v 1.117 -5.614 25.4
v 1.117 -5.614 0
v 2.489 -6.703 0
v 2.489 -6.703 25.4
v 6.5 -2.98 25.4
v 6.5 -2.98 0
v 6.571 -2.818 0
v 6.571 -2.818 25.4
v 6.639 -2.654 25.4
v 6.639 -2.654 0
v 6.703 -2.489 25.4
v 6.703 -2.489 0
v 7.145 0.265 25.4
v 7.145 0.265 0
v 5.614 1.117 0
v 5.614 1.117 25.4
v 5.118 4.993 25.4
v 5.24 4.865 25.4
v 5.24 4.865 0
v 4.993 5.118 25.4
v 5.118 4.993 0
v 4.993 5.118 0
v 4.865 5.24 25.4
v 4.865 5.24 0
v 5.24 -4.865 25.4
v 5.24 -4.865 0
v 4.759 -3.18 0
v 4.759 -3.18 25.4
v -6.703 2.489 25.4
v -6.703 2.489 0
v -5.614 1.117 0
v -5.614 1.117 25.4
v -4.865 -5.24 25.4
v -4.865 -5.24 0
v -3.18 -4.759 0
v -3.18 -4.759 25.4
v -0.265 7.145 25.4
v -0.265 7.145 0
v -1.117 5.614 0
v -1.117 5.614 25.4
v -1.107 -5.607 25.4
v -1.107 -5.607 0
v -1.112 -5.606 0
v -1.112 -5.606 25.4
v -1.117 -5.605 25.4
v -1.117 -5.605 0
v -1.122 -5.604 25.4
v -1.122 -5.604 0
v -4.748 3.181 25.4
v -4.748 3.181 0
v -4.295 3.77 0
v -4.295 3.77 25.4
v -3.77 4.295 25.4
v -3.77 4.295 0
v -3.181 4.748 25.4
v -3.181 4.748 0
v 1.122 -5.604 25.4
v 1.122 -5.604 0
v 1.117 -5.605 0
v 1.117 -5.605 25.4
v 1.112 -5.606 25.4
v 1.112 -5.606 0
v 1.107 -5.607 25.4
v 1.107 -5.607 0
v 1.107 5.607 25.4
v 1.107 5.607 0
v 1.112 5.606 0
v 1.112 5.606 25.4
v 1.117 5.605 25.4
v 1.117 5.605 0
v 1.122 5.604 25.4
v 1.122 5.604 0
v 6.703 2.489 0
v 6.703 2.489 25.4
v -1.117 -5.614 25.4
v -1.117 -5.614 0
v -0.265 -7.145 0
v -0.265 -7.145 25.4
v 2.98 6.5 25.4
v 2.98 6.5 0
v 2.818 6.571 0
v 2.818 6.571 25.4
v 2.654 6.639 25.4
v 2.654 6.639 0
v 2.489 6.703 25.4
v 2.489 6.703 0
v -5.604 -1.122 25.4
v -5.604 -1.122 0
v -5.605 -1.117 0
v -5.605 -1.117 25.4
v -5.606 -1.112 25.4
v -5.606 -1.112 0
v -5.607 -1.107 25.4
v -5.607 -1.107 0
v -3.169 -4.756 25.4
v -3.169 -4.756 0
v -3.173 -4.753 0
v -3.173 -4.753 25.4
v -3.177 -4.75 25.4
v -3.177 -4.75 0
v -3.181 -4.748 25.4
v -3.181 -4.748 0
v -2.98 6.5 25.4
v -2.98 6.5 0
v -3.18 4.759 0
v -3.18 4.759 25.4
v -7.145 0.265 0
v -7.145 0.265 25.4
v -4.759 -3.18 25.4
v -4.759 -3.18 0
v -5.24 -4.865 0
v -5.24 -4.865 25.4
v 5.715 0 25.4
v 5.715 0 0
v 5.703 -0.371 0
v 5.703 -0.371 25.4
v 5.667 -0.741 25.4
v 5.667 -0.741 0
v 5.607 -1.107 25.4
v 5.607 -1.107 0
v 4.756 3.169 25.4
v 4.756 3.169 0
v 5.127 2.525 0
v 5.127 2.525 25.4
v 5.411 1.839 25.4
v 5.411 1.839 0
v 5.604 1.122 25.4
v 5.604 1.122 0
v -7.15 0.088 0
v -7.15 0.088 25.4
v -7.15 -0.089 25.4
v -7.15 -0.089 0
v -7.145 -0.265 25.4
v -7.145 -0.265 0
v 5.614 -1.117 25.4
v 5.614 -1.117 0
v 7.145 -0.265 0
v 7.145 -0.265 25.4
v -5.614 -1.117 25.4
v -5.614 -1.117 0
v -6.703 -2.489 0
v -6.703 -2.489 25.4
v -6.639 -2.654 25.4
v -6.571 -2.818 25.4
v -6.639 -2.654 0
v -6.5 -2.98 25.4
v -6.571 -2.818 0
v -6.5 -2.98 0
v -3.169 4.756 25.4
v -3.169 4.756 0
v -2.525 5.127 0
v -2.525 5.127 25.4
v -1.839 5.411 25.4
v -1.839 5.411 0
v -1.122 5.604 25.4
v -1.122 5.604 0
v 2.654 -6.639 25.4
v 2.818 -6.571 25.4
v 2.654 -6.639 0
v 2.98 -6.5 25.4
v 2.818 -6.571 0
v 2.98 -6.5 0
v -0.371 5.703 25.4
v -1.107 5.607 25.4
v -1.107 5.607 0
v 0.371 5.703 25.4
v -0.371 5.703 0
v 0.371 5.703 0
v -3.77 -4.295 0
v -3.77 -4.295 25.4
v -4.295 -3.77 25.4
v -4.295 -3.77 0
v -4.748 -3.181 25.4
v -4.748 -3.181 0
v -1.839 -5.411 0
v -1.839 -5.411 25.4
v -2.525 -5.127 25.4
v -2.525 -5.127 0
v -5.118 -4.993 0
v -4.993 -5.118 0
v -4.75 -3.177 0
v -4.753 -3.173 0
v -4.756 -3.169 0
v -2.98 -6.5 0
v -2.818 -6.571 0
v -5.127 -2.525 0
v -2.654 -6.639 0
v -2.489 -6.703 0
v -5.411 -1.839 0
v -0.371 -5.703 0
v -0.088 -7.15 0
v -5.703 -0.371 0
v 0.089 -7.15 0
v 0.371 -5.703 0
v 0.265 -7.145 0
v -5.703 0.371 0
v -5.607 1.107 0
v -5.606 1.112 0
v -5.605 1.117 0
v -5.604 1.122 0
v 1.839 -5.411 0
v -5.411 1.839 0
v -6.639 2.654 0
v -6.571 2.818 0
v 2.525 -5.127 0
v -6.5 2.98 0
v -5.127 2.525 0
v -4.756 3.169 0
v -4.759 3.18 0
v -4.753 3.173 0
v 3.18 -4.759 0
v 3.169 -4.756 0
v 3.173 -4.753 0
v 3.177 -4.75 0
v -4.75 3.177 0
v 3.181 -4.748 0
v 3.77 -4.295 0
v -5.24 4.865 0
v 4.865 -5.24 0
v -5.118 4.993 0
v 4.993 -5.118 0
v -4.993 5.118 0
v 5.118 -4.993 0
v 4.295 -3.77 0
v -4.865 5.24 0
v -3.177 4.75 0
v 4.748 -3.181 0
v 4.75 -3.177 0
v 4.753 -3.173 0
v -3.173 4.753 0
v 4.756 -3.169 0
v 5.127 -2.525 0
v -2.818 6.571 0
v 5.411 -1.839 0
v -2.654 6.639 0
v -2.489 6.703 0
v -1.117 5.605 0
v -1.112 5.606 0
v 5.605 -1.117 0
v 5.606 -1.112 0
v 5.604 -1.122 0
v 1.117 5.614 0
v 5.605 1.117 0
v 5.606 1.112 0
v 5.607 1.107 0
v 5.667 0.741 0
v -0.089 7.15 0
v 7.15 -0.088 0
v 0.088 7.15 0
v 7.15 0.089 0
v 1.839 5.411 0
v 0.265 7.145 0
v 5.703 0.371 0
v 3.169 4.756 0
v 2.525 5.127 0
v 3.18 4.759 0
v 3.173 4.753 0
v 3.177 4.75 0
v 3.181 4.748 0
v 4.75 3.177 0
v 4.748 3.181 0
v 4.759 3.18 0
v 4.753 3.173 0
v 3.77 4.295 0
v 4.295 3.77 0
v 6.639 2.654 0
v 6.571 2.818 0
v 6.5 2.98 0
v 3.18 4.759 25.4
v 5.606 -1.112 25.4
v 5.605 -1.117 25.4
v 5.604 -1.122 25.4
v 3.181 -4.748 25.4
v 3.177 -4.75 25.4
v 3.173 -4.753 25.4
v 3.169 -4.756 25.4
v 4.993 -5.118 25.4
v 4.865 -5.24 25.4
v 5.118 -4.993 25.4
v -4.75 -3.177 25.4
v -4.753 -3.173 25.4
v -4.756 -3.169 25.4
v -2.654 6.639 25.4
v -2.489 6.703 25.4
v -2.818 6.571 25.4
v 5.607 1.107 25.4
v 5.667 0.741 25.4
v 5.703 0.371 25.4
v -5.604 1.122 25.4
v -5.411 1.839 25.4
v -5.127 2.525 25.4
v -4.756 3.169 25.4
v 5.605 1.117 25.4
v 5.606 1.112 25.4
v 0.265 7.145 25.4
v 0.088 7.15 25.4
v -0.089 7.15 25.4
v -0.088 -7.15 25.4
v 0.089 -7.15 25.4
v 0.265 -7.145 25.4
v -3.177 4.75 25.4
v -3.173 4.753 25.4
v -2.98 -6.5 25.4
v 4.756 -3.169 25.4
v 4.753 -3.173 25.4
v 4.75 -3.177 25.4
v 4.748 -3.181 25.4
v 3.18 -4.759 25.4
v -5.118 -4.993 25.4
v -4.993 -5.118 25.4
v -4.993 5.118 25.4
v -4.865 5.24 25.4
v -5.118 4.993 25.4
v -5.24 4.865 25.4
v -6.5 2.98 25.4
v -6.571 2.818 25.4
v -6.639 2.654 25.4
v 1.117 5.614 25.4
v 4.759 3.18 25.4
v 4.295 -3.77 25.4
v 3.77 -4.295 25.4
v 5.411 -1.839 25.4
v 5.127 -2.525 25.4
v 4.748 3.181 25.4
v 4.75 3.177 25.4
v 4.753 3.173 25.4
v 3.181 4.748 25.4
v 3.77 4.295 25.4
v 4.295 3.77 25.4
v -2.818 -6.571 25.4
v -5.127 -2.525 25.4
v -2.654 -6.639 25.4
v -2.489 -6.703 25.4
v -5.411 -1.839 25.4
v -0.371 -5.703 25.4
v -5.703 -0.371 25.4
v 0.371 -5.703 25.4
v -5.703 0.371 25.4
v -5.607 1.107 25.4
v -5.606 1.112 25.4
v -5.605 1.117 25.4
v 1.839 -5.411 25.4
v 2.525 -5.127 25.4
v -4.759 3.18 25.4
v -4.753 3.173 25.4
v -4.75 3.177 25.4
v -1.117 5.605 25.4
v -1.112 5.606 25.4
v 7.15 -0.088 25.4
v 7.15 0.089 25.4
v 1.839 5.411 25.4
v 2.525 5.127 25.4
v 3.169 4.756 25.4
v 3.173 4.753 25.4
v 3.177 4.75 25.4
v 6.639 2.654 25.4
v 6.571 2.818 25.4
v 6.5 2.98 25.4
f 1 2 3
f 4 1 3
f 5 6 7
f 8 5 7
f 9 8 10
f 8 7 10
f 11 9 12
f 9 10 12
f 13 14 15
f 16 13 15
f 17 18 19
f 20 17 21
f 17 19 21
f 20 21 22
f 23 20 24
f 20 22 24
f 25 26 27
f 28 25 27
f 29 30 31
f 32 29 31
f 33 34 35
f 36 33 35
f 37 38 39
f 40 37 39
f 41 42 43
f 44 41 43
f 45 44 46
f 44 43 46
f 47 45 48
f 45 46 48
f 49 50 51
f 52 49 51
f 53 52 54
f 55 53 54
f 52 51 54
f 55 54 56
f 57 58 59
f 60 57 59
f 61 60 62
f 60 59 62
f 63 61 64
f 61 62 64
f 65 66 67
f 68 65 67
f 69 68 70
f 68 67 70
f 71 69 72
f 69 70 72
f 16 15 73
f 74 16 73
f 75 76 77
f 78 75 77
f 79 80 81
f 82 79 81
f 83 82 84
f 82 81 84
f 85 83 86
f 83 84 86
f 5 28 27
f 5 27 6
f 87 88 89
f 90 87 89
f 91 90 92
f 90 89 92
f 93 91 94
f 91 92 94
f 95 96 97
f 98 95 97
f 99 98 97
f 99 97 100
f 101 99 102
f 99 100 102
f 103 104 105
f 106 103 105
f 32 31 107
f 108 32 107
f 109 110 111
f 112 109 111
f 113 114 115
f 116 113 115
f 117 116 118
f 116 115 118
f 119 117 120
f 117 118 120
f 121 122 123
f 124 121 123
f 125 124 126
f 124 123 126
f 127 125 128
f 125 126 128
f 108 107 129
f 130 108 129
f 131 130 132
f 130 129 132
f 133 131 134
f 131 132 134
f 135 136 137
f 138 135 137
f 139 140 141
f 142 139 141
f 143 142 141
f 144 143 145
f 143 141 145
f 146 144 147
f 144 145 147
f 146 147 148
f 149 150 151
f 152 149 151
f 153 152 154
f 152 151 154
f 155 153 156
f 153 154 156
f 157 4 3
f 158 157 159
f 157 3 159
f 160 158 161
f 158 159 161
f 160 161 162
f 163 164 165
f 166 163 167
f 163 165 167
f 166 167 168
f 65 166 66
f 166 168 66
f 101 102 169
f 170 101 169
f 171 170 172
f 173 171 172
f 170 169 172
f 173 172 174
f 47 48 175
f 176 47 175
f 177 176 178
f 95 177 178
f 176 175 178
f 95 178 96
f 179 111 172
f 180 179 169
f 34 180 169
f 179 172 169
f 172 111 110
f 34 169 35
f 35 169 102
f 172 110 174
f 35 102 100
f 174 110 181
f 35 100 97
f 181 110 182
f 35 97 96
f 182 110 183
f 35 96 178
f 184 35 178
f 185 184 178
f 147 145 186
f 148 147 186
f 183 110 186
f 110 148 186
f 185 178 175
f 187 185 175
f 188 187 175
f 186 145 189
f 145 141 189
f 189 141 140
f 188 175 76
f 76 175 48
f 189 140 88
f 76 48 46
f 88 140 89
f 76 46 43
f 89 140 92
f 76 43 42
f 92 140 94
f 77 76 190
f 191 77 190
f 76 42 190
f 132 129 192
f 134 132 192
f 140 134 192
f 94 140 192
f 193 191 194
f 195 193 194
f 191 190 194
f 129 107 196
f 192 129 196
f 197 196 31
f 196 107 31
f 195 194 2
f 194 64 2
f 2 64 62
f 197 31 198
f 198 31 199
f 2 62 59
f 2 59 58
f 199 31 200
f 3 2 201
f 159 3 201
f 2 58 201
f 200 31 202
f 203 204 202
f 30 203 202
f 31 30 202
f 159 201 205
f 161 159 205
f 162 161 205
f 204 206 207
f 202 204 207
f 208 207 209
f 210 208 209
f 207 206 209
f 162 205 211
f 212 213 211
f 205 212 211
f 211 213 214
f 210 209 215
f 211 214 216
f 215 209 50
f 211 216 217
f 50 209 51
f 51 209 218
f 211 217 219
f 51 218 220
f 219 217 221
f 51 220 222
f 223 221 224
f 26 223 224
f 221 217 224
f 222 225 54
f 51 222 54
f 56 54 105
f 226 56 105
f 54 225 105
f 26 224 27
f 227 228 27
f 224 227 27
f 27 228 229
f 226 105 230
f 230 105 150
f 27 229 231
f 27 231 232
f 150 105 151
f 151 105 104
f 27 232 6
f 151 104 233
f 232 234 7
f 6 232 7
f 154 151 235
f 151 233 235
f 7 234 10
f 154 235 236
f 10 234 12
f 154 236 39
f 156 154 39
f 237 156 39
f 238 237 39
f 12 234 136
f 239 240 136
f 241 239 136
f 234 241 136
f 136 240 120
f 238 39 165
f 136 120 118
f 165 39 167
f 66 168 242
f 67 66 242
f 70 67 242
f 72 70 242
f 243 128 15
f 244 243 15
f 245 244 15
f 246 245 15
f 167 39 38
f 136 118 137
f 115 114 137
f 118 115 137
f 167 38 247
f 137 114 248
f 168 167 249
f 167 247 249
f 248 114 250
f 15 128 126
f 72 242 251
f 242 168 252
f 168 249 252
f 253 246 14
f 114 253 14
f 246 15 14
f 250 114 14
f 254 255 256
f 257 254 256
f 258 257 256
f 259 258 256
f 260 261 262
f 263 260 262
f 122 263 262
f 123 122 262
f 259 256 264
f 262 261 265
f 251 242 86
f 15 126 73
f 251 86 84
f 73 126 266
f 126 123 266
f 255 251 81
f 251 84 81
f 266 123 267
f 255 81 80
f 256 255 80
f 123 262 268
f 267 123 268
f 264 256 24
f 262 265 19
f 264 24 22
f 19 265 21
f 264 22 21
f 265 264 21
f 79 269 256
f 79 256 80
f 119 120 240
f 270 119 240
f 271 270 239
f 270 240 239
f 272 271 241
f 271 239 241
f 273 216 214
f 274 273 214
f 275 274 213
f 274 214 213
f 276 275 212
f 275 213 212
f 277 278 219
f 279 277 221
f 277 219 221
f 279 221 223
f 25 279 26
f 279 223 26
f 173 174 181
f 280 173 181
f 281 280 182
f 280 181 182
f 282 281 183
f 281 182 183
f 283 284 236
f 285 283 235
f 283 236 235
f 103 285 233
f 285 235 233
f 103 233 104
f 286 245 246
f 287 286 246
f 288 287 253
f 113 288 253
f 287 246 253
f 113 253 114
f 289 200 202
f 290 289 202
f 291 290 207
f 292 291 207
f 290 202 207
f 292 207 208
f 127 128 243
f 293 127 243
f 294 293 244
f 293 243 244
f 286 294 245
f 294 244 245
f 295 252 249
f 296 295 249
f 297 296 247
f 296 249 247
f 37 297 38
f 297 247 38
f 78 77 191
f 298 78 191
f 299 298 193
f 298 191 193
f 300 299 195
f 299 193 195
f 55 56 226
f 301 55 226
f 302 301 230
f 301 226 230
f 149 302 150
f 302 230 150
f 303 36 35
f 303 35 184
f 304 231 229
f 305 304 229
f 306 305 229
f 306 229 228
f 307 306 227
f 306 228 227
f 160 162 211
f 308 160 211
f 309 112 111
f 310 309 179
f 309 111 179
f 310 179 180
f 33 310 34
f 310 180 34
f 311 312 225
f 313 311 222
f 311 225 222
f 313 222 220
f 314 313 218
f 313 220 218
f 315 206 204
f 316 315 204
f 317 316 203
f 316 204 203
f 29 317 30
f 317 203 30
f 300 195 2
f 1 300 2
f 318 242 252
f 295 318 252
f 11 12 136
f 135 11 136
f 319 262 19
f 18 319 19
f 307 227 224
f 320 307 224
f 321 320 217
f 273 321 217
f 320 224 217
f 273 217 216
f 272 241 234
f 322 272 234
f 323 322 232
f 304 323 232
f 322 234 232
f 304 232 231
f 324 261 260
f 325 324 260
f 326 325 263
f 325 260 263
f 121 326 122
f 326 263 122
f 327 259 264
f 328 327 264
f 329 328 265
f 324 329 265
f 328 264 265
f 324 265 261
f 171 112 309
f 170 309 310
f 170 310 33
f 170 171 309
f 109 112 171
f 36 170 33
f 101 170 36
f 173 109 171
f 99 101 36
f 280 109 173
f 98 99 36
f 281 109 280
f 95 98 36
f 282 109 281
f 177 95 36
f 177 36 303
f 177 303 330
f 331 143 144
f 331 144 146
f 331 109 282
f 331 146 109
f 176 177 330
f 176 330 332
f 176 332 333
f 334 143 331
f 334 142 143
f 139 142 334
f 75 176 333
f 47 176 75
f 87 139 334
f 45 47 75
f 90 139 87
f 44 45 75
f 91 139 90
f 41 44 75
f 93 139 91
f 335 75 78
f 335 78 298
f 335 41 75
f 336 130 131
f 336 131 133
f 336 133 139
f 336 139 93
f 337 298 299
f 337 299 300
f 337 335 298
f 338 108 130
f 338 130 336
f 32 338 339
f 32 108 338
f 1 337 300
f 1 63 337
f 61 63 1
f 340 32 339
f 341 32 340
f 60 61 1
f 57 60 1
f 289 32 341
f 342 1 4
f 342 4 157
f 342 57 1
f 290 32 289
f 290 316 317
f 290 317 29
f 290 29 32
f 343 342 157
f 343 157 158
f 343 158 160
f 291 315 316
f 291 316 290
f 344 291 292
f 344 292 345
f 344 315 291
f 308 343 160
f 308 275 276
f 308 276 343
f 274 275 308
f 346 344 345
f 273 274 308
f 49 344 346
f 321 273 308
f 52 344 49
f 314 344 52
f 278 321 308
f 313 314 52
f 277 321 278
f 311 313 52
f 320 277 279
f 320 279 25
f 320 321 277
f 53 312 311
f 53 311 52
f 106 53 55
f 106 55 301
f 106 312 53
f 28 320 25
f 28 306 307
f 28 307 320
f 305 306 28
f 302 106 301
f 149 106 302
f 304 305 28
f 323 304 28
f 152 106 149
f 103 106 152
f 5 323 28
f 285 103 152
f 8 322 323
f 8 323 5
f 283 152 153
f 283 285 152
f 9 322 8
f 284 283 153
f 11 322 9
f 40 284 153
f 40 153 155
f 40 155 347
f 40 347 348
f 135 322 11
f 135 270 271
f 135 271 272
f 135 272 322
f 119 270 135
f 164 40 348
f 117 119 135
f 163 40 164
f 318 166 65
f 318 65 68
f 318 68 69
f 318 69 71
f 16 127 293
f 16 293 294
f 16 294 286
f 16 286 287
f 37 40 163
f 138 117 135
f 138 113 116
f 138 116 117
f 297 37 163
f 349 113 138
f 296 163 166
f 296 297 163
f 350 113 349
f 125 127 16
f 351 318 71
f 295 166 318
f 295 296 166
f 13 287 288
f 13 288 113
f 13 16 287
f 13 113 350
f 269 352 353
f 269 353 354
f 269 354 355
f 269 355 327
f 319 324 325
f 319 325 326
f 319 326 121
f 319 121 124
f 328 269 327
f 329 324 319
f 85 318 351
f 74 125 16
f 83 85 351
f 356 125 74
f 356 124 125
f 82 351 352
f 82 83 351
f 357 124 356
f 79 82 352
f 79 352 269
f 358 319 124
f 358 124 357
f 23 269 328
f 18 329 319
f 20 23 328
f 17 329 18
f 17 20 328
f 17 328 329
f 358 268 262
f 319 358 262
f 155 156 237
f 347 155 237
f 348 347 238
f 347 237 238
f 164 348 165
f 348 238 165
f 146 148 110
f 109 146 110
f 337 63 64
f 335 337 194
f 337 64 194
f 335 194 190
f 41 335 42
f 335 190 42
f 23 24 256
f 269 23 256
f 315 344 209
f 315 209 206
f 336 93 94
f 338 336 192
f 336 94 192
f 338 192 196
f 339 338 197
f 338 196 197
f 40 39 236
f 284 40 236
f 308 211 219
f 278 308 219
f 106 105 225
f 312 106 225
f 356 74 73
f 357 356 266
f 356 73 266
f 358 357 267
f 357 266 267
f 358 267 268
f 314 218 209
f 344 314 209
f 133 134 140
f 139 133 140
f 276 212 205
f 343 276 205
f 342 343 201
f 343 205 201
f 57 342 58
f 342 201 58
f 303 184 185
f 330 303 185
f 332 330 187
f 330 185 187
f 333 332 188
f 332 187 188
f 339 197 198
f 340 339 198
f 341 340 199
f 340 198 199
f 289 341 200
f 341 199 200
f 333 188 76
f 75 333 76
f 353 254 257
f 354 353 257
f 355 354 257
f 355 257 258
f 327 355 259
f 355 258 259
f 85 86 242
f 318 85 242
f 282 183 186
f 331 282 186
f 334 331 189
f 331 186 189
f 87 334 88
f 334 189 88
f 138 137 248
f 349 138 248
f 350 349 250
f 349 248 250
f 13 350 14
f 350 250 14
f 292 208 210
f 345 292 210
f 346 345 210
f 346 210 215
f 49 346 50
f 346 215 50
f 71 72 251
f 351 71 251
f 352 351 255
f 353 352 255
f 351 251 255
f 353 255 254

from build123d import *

# Parameters (mm, degrees)
F1_DEPTH = 25.4


with BuildPart() as f1:
    # F0 (on Top) → F1 (new body)
    with BuildSketch(Plane.XY):
        with BuildLine():
            Line((1.1166946055, 5.6140031267), (0.2654481758, 7.145170906))
            ThreePointArc((0.2654481758, 7.145170906), (-6.1331e-06, 7.1501), (-0.2654604336, 7.1451704506))
            Line((-0.2654604336, 7.1451704506), (-1.1166946958, 5.6140031087))
            Line((-1.1166946958, 5.6140031087), (-1.107454392, 5.6066718978))
            ThreePointArc((-1.107454392, 5.6066718978), (0, 5.715), (1.107454392, 5.6066718978))
            Line((1.107454392, 5.6066718978), (1.1166946055, 5.6140031267))
        make_face()
        with BuildLine():
            Line((2.4890848916, 6.7028640455), (1.1166946055, 5.6140031267))
            Line((1.1166946055, 5.6140031267), (1.122426, 5.6036938598))
            ThreePointArc((1.122426, 5.6036938598), (2.187035816, 5.2799715283), (3.168734892, 4.7560849639))
            Line((3.168734892, 4.7560849639), (3.1800772759, 4.7593220597))
            Line((3.1800772759, 4.7593220597), (2.9795806637, 6.4996945373))
            ThreePointArc((2.9795806637, 6.4996945373), (2.7362191435, 6.6058333924), (2.4890848916, 6.7028640455))
        make_face()
        with BuildLine():
            Line((1.122426, 5.6036938598), (1.1166946055, 5.6140031267))
            Line((1.1166946055, 5.6140031267), (1.107454392, 5.6066718978))
            ThreePointArc((1.107454392, 5.6066718978), (1.1149411903, 5.6051878775), (1.122426, 5.6036938598))
        make_face()
        with BuildLine():
            Line((-1.107454392, 5.6066718978), (-1.1166946958, 5.6140031087))
            Line((-1.1166946958, 5.6140031087), (-1.122426, 5.6036938598))
            ThreePointArc((-1.122426, 5.6036938598), (-1.1149411903, 5.6051878775), (-1.107454392, 5.6066718978))
        make_face()
        with BuildLine():
            Line((-1.122426, 5.6036938598), (-1.1166946958, 5.6140031087))
            Line((-1.1166946958, 5.6140031087), (-2.4890963905, 6.7028597754))
            ThreePointArc((-2.4890963905, 6.7028597754), (-2.736230476, 6.6058286984), (-2.9795918141, 6.4996894258))
            Line((-2.9795918141, 6.4996894258), (-3.1800773524, 4.7593220085))
            Line((-3.1800773524, 4.7593220085), (-3.168734892, 4.7560849639))
            ThreePointArc((-3.168734892, 4.7560849639), (-2.187035816, 5.2799715283), (-1.122426, 5.6036938598))
        make_face()
        with BuildLine():
            Line((3.1800772759, 4.7593220597), (3.168734892, 4.7560849639))
            ThreePointArc((3.168734892, 4.7560849639), (3.1750838817, 4.7518488343), (3.1814272084, 4.7476042293))
            Line((3.1814272084, 4.7476042293), (3.1800772759, 4.7593220597))
        make_face()
        with BuildLine():
            ThreePointArc((-3.1814272084, 4.7476042293), (-3.1750838817, 4.7518488343), (-3.168734892, 4.7560849639))
            Line((-3.168734892, 4.7560849639), (-3.1800773524, 4.7593220085))
            Line((-3.1800773524, 4.7593220085), (-3.1814272084, 4.7476042293))
        make_face()
        with BuildLine():
            Line((3.1800772759, 4.7593220597), (3.1814272084, 4.7476042293))
            ThreePointArc((3.1814272084, 4.7476042293), (4.0411152545, 4.0411152545), (4.7476042293, 3.1814272084))
            Line((4.7476042293, 3.1814272084), (4.7593220085, 3.1800773524))
            Line((4.7593220085, 3.1800773524), (5.2400990056, 4.8646985952))
            ThreePointArc((5.2400990056, 4.8646985952), (5.0558798594, 5.0558885329), (4.8646896057, 5.2401073511))
            Line((4.8646896057, 5.2401073511), (3.1800772759, 4.7593220597))
        make_face()
        with BuildLine():
            ThreePointArc((-4.7476042293, 3.1814272084), (-4.0411152545, 4.0411152545), (-3.1814272084, 4.7476042293))
            Line((-3.1814272084, 4.7476042293), (-3.1800773524, 4.7593220085))
            Line((-3.1800773524, 4.7593220085), (-4.8646985952, 5.2400990056))
            ThreePointArc((-4.8646985952, 5.2400990056), (-5.0558885329, 5.0558798594), (-5.2401073511, 4.8646896057))
            Line((-5.2401073511, 4.8646896057), (-4.7593220597, 3.1800772759))
            Line((-4.7593220597, 3.1800772759), (-4.7476042293, 3.1814272084))
        make_face()
        with BuildLine():
            Line((4.7593220085, 3.1800773524), (4.7476042293, 3.1814272084))
            ThreePointArc((4.7476042293, 3.1814272084), (4.7518488343, 3.1750838817), (4.7560849639, 3.168734892))
            Line((4.7560849639, 3.168734892), (4.7593220085, 3.1800773524))
        make_face()
        with BuildLine():
            ThreePointArc((-4.7560849639, 3.168734892), (-4.7518488343, 3.1750838817), (-4.7476042293, 3.1814272084))
            Line((-4.7476042293, 3.1814272084), (-4.7593220597, 3.1800772759))
            Line((-4.7593220597, 3.1800772759), (-4.7560849639, 3.168734892))
        make_face()
        with BuildLine():
            Line((4.7593220085, 3.1800773524), (4.7560849639, 3.168734892))
            ThreePointArc((4.7560849639, 3.168734892), (5.2799715283, 2.187035816), (5.6036938598, 1.122426))
            Line((5.6036938598, 1.122426), (5.6140031087, 1.1166946958))
            Line((5.6140031087, 1.1166946958), (6.7028597754, 2.4890963905))
            ThreePointArc((6.7028597754, 2.4890963905), (6.6058286984, 2.736230476), (6.4996894258, 2.9795918141))
            Line((6.4996894258, 2.9795918141), (4.7593220085, 3.1800773524))
        make_face()
        with BuildLine():
            ThreePointArc((-5.6036938598, 1.122426), (-5.2799715283, 2.187035816), (-4.7560849639, 3.168734892))
            Line((-4.7560849639, 3.168734892), (-4.7593220597, 3.1800772759))
            Line((-4.7593220597, 3.1800772759), (-6.4996945373, 2.9795806637))
            ThreePointArc((-6.4996945373, 2.9795806637), (-6.6058333924, 2.7362191435), (-6.7028640455, 2.4890848916))
            Line((-6.7028640455, 2.4890848916), (-5.6140031267, 1.1166946055))
            Line((-5.6140031267, 1.1166946055), (-5.6036938598, 1.122426))
        make_face()
        with BuildLine():
            Line((5.6140031087, 1.1166946958), (5.6036938598, 1.122426))
            ThreePointArc((5.6036938598, 1.122426), (5.6051878775, 1.1149411903), (5.6066718978, 1.107454392))
            Line((5.6066718978, 1.107454392), (5.6140031087, 1.1166946958))
        make_face()
        with BuildLine():
            ThreePointArc((-5.6066718978, 1.107454392), (-5.6051878775, 1.1149411903), (-5.6036938598, 1.122426))
            Line((-5.6036938598, 1.122426), (-5.6140031267, 1.1166946055))
            Line((-5.6140031267, 1.1166946055), (-5.6066718978, 1.107454392))
        make_face()
        with BuildLine():
            Line((5.6140031087, 1.1166946958), (5.6066718978, 1.107454392))
            ThreePointArc((5.6066718978, 1.107454392), (5.6878535009, 0.5563699777), (5.715, 0))
            ThreePointArc((5.715, 0), (5.6878535009, -0.5563699777), (5.6066718978, -1.107454392))
            Line((5.6066718978, -1.107454392), (5.6140031267, -1.1166946055))
            Line((5.6140031267, -1.1166946055), (7.145170906, -0.2654481758))
            ThreePointArc((7.145170906, -0.2654481758), (7.1501, 6.1331e-06), (7.1451704506, 0.2654604336))
            Line((7.1451704506, 0.2654604336), (5.6140031087, 1.1166946958))
        make_face()
        with BuildLine():
            ThreePointArc((-5.6066718978, -1.107454392), (-5.715, 0), (-5.6066718978, 1.107454392))
            Line((-5.6066718978, 1.107454392), (-5.6140031267, 1.1166946055))
            Line((-5.6140031267, 1.1166946055), (-7.145170906, 0.2654481758))
            ThreePointArc((-7.145170906, 0.2654481758), (-7.1501, -6.1331e-06), (-7.1451704506, -0.2654604336))
            Line((-7.1451704506, -0.2654604336), (-5.6140031087, -1.1166946958))
            Line((-5.6140031087, -1.1166946958), (-5.6066718978, -1.107454392))
        make_face()
        with BuildLine():
            ThreePointArc((-5.6036938598, -1.122426), (-5.6051878775, -1.1149411903), (-5.6066718978, -1.107454392))
            Line((-5.6066718978, -1.107454392), (-5.6140031087, -1.1166946958))
            Line((-5.6140031087, -1.1166946958), (-5.6036938598, -1.122426))
        make_face()
        with BuildLine():
            Line((5.6140031267, -1.1166946055), (5.6066718978, -1.107454392))
            ThreePointArc((5.6066718978, -1.107454392), (5.6051878775, -1.1149411903), (5.6036938598, -1.122426))
            Line((5.6036938598, -1.122426), (5.6140031267, -1.1166946055))
        make_face()
        with BuildLine():
            ThreePointArc((-4.7560849639, -3.168734892), (-5.2799715283, -2.187035816), (-5.6036938598, -1.122426))
            Line((-5.6036938598, -1.122426), (-5.6140031087, -1.1166946958))
            Line((-5.6140031087, -1.1166946958), (-6.7028597754, -2.4890963905))
            ThreePointArc((-6.7028597754, -2.4890963905), (-6.6058286984, -2.736230476), (-6.4996894258, -2.9795918141))
            Line((-6.4996894258, -2.9795918141), (-4.7593220085, -3.1800773524))
            Line((-4.7593220085, -3.1800773524), (-4.7560849639, -3.168734892))
        make_face()
        with BuildLine():
            Line((5.6140031267, -1.1166946055), (5.6036938598, -1.122426))
            ThreePointArc((5.6036938598, -1.122426), (5.2799715283, -2.187035816), (4.7560849639, -3.168734892))
            Line((4.7560849639, -3.168734892), (4.7593220597, -3.1800772759))
            Line((4.7593220597, -3.1800772759), (6.4996945373, -2.9795806637))
            ThreePointArc((6.4996945373, -2.9795806637), (6.6058333924, -2.7362191435), (6.7028640455, -2.4890848916))
            Line((6.7028640455, -2.4890848916), (5.6140031267, -1.1166946055))
        make_face()
        with BuildLine():
            ThreePointArc((-4.7476042293, -3.1814272084), (-4.7518488343, -3.1750838817), (-4.7560849639, -3.168734892))
            Line((-4.7560849639, -3.168734892), (-4.7593220085, -3.1800773524))
            Line((-4.7593220085, -3.1800773524), (-4.7476042293, -3.1814272084))
        make_face()
        with BuildLine():
            Line((4.7593220597, -3.1800772759), (4.7560849639, -3.168734892))
            ThreePointArc((4.7560849639, -3.168734892), (4.7518488343, -3.1750838817), (4.7476042293, -3.1814272084))
            Line((4.7476042293, -3.1814272084), (4.7593220597, -3.1800772759))
        make_face()
        with BuildLine():
            ThreePointArc((-3.1814272084, -4.7476042293), (-4.0411152545, -4.0411152545), (-4.7476042293, -3.1814272084))
            Line((-4.7476042293, -3.1814272084), (-4.7593220085, -3.1800773524))
            Line((-4.7593220085, -3.1800773524), (-5.2400990056, -4.8646985952))
            ThreePointArc((-5.2400990056, -4.8646985952), (-5.0558798594, -5.0558885329), (-4.8646896057, -5.2401073511))
            Line((-4.8646896057, -5.2401073511), (-3.1800772759, -4.7593220597))
            Line((-3.1800772759, -4.7593220597), (-3.1814272084, -4.7476042293))
        make_face()
        with BuildLine():
            Line((4.7593220597, -3.1800772759), (4.7476042293, -3.1814272084))
            ThreePointArc((4.7476042293, -3.1814272084), (4.0411152545, -4.0411152545), (3.1814272084, -4.7476042293))
            Line((3.1814272084, -4.7476042293), (3.1800773524, -4.7593220085))
            Line((3.1800773524, -4.7593220085), (4.8646985952, -5.2400990056))
            ThreePointArc((4.8646985952, -5.2400990056), (5.0558885329, -5.0558798594), (5.2401073511, -4.8646896057))
            Line((5.2401073511, -4.8646896057), (4.7593220597, -3.1800772759))
        make_face()
        with BuildLine():
            ThreePointArc((-3.168734892, -4.7560849639), (-3.1750838817, -4.7518488343), (-3.1814272084, -4.7476042293))
            Line((-3.1814272084, -4.7476042293), (-3.1800772759, -4.7593220597))
            Line((-3.1800772759, -4.7593220597), (-3.168734892, -4.7560849639))
        make_face()
        with BuildLine():
            Line((3.1800773524, -4.7593220085), (3.1814272084, -4.7476042293))
            ThreePointArc((3.1814272084, -4.7476042293), (3.1750838817, -4.7518488343), (3.168734892, -4.7560849639))
            Line((3.168734892, -4.7560849639), (3.1800773524, -4.7593220085))
        make_face()
        with BuildLine():
            ThreePointArc((-1.122426, -5.6036938598), (-2.187035816, -5.2799715283), (-3.168734892, -4.7560849639))
            Line((-3.168734892, -4.7560849639), (-3.1800772759, -4.7593220597))
            Line((-3.1800772759, -4.7593220597), (-2.9795806637, -6.4996945373))
            ThreePointArc((-2.9795806637, -6.4996945373), (-2.7362191435, -6.6058333924), (-2.4890848916, -6.7028640455))
            Line((-2.4890848916, -6.7028640455), (-1.1166946055, -5.6140031267))
            Line((-1.1166946055, -5.6140031267), (-1.122426, -5.6036938598))
        make_face()
        with BuildLine():
            Line((3.1800773524, -4.7593220085), (3.168734892, -4.7560849639))
            ThreePointArc((3.168734892, -4.7560849639), (2.187035816, -5.2799715283), (1.122426, -5.6036938598))
            Line((1.122426, -5.6036938598), (1.1166946958, -5.6140031087))
            Line((1.1166946958, -5.6140031087), (2.4890963905, -6.7028597754))
            ThreePointArc((2.4890963905, -6.7028597754), (2.736230476, -6.6058286984), (2.9795918141, -6.4996894258))
            Line((2.9795918141, -6.4996894258), (3.1800773524, -4.7593220085))
        make_face()
        with BuildLine():
            ThreePointArc((-1.107454392, -5.6066718978), (-1.1149411903, -5.6051878775), (-1.122426, -5.6036938598))
            Line((-1.122426, -5.6036938598), (-1.1166946055, -5.6140031267))
            Line((-1.1166946055, -5.6140031267), (-1.107454392, -5.6066718978))
        make_face()
        with BuildLine():
            Line((1.1166946958, -5.6140031087), (1.122426, -5.6036938598))
            ThreePointArc((1.122426, -5.6036938598), (1.1149411903, -5.6051878775), (1.107454392, -5.6066718978))
            Line((1.107454392, -5.6066718978), (1.1166946958, -5.6140031087))
        make_face()
        with BuildLine():
            ThreePointArc((1.107454392, -5.6066718978), (0, -5.715), (-1.107454392, -5.6066718978))
            Line((-1.107454392, -5.6066718978), (-1.1166946055, -5.6140031267))
            Line((-1.1166946055, -5.6140031267), (-0.2654481758, -7.145170906))
            ThreePointArc((-0.2654481758, -7.145170906), (6.1331e-06, -7.1501), (0.2654604336, -7.1451704506))
            Line((0.2654604336, -7.1451704506), (1.1166946958, -5.6140031087))
            Line((1.1166946958, -5.6140031087), (1.107454392, -5.6066718978))
        make_face()
    extrude(amount=F1_DEPTH)


solid = f1.part
